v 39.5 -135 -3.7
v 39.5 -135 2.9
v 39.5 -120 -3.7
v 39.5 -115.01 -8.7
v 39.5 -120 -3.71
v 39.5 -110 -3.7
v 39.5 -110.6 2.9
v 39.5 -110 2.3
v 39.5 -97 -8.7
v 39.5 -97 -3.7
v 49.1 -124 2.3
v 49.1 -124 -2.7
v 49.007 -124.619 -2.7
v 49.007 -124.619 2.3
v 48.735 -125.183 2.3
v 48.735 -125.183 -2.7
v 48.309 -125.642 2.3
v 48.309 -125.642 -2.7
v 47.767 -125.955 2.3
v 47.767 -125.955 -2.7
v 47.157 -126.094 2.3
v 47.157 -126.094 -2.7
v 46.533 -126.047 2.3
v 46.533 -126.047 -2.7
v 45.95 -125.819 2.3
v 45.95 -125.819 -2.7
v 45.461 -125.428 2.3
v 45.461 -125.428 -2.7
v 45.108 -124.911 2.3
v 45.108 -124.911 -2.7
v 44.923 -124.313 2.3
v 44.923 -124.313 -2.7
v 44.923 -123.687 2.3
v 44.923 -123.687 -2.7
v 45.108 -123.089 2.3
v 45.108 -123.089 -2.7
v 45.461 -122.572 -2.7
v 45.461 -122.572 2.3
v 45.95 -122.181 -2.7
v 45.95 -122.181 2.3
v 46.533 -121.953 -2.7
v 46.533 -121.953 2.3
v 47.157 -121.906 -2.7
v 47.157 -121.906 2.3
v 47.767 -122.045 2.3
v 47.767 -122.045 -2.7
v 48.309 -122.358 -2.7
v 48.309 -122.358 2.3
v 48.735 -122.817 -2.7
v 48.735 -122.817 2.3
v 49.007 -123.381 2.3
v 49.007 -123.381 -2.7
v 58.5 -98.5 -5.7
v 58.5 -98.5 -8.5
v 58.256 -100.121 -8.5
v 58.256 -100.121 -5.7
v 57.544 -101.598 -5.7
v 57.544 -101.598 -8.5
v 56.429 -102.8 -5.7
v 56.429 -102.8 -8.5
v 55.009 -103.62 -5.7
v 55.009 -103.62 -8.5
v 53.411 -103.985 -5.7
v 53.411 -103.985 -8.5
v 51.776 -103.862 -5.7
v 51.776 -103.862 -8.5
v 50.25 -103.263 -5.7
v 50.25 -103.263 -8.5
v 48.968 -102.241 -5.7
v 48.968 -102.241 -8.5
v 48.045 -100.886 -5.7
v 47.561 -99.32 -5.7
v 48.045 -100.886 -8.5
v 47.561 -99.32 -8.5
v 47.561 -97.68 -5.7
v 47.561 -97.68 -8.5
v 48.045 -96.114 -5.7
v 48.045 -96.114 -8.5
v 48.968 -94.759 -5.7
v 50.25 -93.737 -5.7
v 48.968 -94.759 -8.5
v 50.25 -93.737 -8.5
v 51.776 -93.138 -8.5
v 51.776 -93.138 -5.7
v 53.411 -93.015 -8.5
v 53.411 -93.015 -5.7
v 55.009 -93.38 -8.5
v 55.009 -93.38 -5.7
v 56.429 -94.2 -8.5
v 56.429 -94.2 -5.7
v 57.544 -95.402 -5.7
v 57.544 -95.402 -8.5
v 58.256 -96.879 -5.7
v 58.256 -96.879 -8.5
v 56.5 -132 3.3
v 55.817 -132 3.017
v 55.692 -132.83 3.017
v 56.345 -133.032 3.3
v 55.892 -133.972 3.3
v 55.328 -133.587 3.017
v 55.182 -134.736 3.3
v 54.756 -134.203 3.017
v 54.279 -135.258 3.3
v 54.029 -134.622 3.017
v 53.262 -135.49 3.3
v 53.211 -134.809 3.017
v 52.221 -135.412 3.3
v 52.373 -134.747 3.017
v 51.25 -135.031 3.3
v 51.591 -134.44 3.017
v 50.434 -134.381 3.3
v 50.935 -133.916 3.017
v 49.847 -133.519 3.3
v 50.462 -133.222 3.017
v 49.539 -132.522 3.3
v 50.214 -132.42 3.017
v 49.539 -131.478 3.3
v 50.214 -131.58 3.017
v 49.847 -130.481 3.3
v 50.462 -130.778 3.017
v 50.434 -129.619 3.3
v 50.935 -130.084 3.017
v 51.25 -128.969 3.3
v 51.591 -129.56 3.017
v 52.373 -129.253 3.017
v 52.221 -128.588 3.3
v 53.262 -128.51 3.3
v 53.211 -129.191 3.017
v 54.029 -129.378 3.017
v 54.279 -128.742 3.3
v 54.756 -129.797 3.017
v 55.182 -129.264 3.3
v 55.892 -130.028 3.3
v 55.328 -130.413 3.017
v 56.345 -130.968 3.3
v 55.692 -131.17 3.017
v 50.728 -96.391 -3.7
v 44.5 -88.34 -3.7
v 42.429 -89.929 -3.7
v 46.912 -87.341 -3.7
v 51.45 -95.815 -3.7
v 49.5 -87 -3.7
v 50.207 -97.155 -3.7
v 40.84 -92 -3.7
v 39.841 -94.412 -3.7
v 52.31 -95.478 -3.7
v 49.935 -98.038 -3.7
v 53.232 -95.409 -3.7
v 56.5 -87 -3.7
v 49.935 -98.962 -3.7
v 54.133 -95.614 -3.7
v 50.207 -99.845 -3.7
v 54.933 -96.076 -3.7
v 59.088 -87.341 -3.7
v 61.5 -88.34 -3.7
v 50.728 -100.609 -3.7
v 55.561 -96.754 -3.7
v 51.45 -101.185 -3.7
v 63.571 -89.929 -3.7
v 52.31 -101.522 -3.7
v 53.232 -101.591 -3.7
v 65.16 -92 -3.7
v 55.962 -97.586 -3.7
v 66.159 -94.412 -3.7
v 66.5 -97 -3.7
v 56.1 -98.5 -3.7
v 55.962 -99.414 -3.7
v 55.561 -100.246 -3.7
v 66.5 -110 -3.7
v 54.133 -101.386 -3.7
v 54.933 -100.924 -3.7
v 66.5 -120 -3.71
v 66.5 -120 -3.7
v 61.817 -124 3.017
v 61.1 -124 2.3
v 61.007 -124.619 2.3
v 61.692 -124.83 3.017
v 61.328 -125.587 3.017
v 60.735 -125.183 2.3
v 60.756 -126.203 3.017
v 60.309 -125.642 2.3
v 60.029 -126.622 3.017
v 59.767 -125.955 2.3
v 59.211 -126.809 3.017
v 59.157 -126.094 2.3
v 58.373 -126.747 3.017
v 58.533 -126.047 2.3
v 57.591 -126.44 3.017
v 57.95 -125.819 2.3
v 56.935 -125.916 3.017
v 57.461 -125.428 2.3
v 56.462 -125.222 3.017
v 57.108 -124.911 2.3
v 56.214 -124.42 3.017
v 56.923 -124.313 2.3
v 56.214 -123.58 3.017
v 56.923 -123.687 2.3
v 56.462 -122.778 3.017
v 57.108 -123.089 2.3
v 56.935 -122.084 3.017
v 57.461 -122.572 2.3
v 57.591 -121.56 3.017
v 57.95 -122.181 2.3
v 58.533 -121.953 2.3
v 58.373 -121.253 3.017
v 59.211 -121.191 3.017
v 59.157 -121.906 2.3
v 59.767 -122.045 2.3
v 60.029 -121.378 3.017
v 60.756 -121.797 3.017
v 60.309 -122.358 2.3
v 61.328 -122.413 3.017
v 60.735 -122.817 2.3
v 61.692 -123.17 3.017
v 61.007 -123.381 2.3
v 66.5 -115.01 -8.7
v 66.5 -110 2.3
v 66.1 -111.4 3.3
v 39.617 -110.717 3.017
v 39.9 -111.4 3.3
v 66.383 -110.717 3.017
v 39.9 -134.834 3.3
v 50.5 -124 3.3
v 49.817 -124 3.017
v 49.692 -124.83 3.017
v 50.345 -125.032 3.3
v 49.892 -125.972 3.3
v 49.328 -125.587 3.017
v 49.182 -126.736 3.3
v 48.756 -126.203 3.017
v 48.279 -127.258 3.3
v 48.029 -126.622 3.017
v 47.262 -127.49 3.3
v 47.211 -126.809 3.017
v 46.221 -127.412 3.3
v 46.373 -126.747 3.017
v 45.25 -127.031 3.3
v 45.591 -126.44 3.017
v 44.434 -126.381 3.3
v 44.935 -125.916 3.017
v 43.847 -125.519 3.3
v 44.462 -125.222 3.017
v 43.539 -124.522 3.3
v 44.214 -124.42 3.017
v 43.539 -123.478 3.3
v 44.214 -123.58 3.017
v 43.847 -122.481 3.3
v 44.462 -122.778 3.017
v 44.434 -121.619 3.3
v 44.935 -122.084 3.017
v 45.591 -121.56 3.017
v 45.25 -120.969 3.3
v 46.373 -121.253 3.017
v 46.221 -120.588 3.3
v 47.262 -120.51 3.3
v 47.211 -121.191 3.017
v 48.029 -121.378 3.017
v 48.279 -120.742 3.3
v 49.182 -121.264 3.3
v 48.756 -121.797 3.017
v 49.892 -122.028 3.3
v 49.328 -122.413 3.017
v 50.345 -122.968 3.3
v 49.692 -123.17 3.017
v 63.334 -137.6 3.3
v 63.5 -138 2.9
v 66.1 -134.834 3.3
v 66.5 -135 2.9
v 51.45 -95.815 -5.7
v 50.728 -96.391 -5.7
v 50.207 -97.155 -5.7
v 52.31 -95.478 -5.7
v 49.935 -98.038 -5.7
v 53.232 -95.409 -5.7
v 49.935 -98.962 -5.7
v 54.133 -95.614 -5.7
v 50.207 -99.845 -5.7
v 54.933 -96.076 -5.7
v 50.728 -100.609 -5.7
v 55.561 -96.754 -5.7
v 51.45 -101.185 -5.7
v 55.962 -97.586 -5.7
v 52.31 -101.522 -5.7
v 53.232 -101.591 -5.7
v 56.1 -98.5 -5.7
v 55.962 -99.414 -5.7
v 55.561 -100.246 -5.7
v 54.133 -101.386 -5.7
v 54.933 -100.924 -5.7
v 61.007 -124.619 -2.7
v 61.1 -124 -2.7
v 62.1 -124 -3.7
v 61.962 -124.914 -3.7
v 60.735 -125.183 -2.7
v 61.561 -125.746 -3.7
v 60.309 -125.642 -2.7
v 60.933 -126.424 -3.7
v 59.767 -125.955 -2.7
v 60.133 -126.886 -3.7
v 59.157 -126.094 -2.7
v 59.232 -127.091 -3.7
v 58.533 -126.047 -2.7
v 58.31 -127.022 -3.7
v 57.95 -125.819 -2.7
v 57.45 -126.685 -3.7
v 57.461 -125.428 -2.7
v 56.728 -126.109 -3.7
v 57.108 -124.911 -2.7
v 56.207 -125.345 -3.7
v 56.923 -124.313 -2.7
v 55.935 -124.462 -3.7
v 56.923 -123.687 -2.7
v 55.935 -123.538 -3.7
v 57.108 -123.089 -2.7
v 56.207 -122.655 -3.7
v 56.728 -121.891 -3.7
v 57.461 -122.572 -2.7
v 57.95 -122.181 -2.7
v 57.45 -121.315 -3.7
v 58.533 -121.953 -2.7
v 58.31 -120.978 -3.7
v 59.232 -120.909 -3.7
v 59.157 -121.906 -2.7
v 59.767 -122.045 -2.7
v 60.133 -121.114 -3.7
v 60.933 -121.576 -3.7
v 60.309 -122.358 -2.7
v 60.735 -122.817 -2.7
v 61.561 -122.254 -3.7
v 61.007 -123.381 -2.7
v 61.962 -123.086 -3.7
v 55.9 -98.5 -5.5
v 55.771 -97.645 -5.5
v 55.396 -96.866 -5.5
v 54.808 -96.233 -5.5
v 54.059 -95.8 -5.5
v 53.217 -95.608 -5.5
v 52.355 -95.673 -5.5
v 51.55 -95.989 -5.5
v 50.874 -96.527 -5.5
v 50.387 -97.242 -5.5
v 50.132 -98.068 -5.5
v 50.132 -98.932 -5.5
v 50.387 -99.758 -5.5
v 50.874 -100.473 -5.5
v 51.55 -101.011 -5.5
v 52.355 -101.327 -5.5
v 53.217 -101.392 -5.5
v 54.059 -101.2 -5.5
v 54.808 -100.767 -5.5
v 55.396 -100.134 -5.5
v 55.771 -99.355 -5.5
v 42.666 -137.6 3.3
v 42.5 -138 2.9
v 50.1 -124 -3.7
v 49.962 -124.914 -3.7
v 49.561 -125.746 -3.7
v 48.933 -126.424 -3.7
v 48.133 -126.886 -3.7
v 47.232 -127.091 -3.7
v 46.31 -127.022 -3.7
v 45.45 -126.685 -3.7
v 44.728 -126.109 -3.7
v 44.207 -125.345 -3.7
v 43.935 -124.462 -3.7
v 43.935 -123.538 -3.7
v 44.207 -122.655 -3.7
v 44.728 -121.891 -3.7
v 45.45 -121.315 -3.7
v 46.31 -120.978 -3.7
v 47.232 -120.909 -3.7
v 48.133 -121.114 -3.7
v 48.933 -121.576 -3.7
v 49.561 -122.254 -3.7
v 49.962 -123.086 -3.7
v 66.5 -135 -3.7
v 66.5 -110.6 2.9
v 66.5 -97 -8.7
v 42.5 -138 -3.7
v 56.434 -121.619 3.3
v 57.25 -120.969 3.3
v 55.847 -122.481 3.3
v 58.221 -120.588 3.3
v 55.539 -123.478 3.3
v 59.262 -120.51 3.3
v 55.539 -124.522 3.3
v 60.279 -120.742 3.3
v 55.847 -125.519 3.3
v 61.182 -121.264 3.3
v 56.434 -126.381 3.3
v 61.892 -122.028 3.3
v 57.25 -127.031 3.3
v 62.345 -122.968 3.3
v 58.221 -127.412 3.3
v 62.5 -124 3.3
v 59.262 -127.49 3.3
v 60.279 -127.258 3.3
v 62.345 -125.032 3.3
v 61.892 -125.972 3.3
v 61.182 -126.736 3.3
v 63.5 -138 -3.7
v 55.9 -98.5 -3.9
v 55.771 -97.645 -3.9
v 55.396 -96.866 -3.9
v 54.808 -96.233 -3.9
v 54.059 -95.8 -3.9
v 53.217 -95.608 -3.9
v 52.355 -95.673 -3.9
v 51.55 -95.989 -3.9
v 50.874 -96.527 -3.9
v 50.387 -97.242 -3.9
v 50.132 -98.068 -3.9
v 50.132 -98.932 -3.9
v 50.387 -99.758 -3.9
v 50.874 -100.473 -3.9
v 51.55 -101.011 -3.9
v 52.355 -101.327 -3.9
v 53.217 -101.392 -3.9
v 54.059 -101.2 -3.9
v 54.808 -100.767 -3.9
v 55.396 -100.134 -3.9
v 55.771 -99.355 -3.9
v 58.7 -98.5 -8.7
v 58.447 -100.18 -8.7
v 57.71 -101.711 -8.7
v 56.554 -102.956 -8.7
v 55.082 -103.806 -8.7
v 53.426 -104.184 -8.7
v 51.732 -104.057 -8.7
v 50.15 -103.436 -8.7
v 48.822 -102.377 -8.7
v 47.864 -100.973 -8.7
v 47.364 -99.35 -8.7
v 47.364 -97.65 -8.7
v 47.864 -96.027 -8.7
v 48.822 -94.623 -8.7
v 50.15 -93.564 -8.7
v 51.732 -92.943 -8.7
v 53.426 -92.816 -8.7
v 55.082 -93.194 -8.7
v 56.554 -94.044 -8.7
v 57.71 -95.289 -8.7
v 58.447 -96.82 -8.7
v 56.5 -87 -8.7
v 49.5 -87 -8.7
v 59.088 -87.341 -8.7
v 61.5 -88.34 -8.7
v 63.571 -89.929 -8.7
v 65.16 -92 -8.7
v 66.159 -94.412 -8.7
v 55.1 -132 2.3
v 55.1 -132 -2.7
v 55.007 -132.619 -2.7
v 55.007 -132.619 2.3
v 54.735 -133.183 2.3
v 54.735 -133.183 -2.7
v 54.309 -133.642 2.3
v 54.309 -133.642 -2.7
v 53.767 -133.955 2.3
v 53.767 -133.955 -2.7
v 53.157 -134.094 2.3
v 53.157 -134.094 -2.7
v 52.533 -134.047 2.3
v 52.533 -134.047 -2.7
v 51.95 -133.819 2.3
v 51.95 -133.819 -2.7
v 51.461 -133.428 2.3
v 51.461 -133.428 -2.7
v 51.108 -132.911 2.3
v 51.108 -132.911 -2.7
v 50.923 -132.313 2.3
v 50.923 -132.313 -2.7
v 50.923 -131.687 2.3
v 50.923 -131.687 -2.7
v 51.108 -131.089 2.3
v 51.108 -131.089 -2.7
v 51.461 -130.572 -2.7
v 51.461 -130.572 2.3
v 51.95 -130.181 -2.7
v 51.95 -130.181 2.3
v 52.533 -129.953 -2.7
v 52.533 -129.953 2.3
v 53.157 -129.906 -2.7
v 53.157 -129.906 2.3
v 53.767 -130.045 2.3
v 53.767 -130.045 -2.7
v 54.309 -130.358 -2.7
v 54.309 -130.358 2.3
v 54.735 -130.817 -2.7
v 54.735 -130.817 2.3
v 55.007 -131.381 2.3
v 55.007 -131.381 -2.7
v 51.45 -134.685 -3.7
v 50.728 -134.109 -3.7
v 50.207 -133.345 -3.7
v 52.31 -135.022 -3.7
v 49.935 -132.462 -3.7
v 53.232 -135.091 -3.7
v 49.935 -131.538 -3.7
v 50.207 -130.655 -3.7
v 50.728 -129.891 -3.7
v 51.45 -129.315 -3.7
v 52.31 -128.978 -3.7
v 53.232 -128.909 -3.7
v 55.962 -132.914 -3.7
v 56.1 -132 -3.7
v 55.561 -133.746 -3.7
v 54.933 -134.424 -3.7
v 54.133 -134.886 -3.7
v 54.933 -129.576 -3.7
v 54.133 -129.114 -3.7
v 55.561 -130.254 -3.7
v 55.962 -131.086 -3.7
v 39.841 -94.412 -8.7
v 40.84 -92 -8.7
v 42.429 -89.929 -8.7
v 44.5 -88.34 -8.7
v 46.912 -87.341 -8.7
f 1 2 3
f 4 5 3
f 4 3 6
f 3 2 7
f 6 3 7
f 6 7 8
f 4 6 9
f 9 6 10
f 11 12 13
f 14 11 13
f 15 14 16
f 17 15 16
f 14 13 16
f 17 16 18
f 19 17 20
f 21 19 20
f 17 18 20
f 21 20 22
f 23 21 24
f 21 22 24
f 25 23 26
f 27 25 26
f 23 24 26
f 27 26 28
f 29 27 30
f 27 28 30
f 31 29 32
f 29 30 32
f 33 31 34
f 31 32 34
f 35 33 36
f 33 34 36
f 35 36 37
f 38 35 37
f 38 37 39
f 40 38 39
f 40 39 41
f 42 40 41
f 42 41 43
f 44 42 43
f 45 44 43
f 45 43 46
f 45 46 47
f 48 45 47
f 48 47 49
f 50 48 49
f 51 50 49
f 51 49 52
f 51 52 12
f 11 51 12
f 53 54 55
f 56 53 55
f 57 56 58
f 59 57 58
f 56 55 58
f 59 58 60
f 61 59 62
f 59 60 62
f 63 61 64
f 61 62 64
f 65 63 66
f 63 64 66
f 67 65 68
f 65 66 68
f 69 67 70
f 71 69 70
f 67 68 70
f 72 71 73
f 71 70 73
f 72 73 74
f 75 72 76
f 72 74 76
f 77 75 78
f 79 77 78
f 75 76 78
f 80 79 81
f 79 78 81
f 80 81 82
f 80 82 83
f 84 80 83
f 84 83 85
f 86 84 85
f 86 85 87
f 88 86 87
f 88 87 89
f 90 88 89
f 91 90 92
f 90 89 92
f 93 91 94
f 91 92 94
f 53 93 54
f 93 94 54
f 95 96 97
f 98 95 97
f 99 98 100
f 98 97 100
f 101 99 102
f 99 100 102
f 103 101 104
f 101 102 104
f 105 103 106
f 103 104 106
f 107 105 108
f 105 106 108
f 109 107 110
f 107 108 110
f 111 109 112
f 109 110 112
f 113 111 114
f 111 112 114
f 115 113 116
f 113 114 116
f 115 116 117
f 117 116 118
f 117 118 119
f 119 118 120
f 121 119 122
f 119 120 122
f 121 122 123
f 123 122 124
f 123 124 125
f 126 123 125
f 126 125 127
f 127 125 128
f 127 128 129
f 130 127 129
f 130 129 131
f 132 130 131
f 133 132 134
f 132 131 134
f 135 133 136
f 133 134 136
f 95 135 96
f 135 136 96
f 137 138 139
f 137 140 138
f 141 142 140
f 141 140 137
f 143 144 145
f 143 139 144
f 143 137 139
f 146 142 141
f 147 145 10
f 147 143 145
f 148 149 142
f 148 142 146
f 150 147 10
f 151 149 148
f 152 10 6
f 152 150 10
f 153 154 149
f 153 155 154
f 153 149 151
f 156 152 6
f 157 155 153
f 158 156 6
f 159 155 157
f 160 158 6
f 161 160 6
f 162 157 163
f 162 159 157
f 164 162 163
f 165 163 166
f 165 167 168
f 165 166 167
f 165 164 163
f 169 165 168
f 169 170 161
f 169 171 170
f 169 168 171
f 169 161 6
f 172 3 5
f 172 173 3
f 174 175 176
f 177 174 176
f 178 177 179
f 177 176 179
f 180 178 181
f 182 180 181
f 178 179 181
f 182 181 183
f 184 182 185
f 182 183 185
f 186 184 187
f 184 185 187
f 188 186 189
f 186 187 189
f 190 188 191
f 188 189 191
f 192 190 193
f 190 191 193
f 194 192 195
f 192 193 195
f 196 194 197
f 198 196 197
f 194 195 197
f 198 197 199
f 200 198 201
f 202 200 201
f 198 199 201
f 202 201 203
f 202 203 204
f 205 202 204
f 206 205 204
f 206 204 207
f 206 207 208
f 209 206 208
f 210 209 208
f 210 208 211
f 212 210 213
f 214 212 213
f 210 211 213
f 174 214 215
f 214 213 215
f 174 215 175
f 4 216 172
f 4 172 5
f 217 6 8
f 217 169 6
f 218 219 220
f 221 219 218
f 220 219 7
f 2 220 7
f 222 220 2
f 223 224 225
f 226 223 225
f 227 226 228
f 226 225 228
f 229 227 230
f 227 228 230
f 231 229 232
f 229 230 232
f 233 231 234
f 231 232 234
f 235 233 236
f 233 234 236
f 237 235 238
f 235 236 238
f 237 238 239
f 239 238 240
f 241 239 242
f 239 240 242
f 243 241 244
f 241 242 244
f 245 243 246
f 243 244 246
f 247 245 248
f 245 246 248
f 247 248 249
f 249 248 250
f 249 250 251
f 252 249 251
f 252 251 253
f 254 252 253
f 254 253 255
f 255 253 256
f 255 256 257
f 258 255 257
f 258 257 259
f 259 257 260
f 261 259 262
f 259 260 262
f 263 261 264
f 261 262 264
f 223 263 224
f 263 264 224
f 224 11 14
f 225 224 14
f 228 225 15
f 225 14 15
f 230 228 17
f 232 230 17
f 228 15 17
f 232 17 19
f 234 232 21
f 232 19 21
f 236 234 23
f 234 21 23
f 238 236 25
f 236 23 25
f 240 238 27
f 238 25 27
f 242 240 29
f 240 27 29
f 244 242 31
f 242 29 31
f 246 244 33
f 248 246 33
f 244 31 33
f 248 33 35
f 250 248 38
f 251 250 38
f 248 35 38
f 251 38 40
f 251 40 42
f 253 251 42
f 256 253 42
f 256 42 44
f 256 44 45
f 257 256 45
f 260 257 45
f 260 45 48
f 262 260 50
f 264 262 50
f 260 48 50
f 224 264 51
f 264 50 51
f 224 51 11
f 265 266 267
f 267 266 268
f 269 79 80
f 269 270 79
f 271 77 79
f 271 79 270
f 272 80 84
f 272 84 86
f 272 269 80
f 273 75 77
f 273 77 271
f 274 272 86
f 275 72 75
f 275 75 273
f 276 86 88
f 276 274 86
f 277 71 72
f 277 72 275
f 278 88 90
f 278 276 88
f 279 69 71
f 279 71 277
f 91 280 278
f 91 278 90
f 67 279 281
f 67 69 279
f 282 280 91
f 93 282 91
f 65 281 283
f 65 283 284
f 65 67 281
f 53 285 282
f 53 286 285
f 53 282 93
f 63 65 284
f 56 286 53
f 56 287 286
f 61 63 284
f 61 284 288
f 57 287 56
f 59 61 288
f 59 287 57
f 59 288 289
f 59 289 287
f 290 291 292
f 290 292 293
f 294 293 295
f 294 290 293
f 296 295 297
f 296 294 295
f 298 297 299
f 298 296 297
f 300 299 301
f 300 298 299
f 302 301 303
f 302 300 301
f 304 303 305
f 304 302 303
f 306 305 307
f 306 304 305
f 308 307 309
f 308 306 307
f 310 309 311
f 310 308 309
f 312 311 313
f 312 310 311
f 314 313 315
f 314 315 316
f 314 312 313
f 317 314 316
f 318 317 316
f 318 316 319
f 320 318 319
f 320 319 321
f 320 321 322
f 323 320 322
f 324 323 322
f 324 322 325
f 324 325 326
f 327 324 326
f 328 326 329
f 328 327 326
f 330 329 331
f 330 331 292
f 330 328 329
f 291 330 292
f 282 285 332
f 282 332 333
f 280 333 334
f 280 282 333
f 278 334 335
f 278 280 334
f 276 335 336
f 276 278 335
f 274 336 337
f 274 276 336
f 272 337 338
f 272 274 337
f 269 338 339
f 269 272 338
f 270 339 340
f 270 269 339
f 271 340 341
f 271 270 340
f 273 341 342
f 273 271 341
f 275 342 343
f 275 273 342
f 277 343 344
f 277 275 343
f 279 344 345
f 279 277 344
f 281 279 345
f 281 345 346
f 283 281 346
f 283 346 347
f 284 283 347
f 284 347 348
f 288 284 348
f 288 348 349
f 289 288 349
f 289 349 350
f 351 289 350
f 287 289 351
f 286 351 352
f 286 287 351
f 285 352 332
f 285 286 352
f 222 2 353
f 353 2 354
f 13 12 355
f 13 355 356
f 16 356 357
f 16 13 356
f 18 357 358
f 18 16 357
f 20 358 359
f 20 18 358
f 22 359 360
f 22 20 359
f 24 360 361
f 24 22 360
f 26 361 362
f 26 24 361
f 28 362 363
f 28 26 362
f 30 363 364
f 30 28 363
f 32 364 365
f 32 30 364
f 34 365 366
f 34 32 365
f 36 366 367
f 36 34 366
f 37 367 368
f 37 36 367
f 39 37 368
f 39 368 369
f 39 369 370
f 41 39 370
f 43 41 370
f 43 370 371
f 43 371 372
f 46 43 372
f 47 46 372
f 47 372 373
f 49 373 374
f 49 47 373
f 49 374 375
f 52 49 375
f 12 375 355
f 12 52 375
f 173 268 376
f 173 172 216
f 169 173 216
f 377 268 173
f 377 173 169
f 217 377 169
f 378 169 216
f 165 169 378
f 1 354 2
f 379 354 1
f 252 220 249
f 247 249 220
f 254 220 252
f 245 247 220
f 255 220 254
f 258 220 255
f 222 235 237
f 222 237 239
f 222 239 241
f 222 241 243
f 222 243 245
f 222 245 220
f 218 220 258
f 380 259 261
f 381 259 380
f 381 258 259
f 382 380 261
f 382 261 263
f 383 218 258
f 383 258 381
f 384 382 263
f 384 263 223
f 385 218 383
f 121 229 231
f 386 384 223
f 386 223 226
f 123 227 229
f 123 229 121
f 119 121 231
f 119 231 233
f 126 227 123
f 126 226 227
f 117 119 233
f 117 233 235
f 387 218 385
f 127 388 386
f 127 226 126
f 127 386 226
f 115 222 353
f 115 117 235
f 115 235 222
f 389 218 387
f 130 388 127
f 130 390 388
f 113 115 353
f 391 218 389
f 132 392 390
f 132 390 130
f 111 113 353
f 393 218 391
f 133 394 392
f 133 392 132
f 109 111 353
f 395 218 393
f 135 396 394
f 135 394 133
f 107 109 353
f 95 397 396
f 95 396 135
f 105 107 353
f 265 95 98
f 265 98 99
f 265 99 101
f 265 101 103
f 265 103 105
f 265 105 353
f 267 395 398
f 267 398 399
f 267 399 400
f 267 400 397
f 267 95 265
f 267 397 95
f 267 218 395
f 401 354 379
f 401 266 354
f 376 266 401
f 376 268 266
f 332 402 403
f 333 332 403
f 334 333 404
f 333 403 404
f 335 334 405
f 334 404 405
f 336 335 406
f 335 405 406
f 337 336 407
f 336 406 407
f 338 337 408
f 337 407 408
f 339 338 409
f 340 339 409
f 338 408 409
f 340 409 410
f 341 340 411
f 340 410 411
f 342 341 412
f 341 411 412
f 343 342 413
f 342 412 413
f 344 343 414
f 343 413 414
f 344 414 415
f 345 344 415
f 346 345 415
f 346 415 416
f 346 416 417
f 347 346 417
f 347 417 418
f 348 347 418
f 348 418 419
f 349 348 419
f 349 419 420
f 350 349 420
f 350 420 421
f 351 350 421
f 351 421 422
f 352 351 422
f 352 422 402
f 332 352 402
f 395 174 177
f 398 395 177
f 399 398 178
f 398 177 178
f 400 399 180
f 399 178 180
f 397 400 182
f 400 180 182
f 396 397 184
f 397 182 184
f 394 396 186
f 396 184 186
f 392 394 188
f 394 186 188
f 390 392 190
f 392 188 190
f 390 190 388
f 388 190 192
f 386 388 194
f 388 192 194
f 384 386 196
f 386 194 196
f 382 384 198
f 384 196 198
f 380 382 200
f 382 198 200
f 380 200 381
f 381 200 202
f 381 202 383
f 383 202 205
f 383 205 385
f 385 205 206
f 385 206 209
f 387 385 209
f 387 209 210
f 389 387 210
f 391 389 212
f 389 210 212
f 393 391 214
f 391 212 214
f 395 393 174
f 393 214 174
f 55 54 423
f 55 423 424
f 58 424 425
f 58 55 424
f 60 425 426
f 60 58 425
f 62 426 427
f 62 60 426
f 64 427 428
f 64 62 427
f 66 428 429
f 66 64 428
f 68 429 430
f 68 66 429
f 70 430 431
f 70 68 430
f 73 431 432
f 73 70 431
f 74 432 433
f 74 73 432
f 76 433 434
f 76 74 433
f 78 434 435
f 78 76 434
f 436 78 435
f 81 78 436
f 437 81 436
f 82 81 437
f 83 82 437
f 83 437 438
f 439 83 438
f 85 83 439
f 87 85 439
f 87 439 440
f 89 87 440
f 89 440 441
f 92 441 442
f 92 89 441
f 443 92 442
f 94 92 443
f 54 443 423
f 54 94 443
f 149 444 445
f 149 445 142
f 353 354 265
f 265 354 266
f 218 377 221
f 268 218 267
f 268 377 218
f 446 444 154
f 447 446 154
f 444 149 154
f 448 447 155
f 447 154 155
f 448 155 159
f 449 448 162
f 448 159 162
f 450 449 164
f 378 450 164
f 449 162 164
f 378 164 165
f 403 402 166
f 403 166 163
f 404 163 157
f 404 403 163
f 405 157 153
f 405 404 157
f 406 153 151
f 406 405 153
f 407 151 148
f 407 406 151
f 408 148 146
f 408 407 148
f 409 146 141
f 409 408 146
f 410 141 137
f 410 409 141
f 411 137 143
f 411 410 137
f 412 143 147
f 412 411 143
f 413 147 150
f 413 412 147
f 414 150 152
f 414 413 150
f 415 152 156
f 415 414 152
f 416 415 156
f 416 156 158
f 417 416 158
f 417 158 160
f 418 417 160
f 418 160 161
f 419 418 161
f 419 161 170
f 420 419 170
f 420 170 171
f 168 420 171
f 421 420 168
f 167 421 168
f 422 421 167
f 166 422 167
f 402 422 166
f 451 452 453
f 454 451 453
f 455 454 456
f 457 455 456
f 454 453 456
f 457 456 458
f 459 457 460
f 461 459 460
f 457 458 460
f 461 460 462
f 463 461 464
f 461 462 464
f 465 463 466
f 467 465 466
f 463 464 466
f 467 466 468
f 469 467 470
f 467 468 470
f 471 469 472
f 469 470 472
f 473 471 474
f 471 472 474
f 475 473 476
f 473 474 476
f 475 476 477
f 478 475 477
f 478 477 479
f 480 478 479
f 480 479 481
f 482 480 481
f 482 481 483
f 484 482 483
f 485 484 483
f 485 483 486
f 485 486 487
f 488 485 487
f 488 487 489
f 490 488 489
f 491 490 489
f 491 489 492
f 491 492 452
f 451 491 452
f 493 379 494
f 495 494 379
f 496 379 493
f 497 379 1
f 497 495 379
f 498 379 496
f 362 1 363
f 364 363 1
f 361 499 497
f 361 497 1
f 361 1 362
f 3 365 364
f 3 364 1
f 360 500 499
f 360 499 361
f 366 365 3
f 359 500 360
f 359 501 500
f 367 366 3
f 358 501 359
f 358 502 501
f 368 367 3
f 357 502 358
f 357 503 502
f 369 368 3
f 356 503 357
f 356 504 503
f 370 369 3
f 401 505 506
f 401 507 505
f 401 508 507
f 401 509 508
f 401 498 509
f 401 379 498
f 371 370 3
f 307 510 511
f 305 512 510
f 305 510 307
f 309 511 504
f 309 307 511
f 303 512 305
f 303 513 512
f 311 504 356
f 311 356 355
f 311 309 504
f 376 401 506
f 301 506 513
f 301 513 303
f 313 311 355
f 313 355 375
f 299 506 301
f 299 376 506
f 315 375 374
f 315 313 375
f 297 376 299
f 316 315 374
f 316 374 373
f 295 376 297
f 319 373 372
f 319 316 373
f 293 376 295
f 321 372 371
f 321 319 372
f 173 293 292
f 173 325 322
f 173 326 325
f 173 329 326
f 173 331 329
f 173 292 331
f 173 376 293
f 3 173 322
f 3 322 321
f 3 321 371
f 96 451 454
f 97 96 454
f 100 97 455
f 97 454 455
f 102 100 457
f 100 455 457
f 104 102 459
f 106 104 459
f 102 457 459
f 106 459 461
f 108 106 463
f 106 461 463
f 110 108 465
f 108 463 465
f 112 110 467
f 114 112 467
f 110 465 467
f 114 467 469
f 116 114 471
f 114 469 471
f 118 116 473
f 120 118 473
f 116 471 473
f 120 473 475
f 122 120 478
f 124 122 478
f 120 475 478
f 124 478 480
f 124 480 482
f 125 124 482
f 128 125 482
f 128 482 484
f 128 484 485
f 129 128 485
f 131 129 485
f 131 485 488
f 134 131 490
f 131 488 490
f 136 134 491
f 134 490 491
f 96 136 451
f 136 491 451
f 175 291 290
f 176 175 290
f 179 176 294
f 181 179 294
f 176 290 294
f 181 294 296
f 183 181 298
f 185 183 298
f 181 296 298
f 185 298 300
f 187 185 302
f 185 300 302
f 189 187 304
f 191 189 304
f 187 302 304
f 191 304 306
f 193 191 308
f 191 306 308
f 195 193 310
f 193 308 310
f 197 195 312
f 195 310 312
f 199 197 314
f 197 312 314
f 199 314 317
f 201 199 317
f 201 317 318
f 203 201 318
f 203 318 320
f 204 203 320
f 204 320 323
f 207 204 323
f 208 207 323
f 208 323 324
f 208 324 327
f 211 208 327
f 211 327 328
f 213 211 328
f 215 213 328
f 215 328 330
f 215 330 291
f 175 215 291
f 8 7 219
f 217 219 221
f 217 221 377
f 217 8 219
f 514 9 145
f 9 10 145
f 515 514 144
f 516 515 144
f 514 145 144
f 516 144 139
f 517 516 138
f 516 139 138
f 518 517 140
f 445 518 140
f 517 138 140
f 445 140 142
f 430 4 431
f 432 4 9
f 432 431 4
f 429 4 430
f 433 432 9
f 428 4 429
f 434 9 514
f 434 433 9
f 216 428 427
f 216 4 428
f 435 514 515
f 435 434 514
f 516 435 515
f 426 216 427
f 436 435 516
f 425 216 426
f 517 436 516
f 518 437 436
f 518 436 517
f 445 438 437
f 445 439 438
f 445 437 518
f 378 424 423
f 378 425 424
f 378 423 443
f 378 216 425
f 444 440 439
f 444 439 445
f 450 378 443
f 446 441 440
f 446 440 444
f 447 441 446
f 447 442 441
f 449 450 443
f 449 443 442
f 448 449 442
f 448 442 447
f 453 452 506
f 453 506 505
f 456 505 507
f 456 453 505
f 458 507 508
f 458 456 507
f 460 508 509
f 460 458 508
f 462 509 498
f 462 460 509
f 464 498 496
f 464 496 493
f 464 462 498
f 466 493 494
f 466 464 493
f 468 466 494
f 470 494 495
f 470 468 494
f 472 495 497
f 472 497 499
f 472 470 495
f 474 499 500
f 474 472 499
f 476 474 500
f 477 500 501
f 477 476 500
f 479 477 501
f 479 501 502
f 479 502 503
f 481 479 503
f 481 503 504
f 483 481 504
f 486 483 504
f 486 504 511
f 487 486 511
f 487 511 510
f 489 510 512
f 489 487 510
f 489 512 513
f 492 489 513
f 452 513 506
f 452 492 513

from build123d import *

# Parameters (mm, degrees)
PAD024_DEPTH    = 13.5
SKETCH067_R     = 2.9
POCKET045_DEPTH = 5.001
SKETCH068_R     = 5.5
POCKET046_DEPTH = 3
SKETCH069_R     = 2.1
POCKET047_DEPTH = 7.001
CHAMFER023_SIZE = 4.99
FILLET014_R     = 10
CHAMFER024_SIZE = 3
CHAMFER025_SIZE = 0.2
CHAMFER026_SIZE = 1
CHAMFER027_SIZE = 1
CHAMFER028_SIZE = 0.4


with BuildPart() as part:
    # Sketch066 → Pad024 (new body, symmetric)
    with BuildSketch(Plane.YZ):
        Polygon((23, 0), (0, 0), (0, 7), (-28, 7), (-28, 0), (-10, 0), (-10, -5), (23, -5), align=None)
    extrude(amount=PAD024_DEPTH, both=True)

    # Sketch067 → Pocket045 (cut, through all)
    with BuildSketch(Plane.XY):
        with Locations((0, 11.5)):
            Circle(SKETCH067_R)
    extrude(amount=-POCKET045_DEPTH, mode=Mode.SUBTRACT)

    # Sketch068 (on Face7 of Pocket045) → Pocket046 (cut)
    with BuildSketch(Plane(origin=(0, 0, -5), x_dir=(1, 0, 0), z_dir=(0, 0, -1))):
        with Locations((0, -11.5)):
            Circle(SKETCH068_R)
    extrude(amount=-POCKET046_DEPTH, mode=Mode.SUBTRACT)

    # Sketch069 (on Face10 of Pocket046) → Pocket047 (cut, through all)
    with BuildSketch(Plane(origin=(0, 0, 0), x_dir=(1, 0, 0), z_dir=(0, 0, -1))):
        with Locations((0, 22)):
            Circle(SKETCH069_R)
        with Locations((-6, 14)):
            Circle(SKETCH069_R)
        with Locations((6, 14)):
            Circle(SKETCH069_R)
    extrude(amount=-POCKET047_DEPTH, mode=Mode.SUBTRACT)

    # Chamfer023
    chamfer023_edges = [part.edges().sort_by_distance(p)[0] for p in [
        (0, -10, -5),
    ]]
    chamfer(chamfer023_edges, length=CHAMFER023_SIZE)

    # Fillet014
    fillet014_edges = [part.edges().sort_by_distance(p)[0] for p in [
        (13.5, 23, -2.5),
        (-13.5, 23, -2.5),
    ]]
    fillet(fillet014_edges, radius=FILLET014_R)

    # Chamfer024
    chamfer024_edges = [part.edges().sort_by_distance(p)[0] for p in [
        (13.5, -28, 3.5),
        (-13.5, -28, 3.5),
    ]]
    chamfer(chamfer024_edges, length=CHAMFER024_SIZE)

    # Chamfer025
    chamfer025_edges = [part.edges().sort_by_distance(p)[0] for p in [
        (-2.9, 11.5, 0),
        (-2.9, 11.5, -2),
        (-5.5, 11.5, -5),
    ]]
    chamfer(chamfer025_edges, length=CHAMFER025_SIZE)

    # Chamfer026
    chamfer026_edges = [part.edges().sort_by_distance(p)[0] for p in [
        (3.9, -14, 0),
        (3.9, -14, 7),
        (-2.1, -22, 7),
        (-2.1, -22, 0),
        (-8.1, -14, 0),
        (-8.1, -14, 7),
    ]]
    chamfer(chamfer026_edges, length=CHAMFER026_SIZE)

    # Chamfer027
    chamfer027_edges = [part.edges().sort_by_distance(p)[0] for p in [
        (0, 0, 7),
    ]]
    chamfer(chamfer027_edges, length=CHAMFER027_SIZE)

    # Chamfer028
    chamfer028_edges = [part.edges().sort_by_distance(p)[0] for p in [
        (-13.5, -13, 7),
        (0, -1, 7),
        (-12, -26.5, 7),
        (13.5, -13, 7),
        (0, -28, 7),
        (12, -26.5, 7),
        (2.9, -14, 7),
        (-3.1, -22, 7),
        (-9.1, -14, 7),
    ]]
    chamfer(chamfer028_edges, length=CHAMFER028_SIZE)


with BuildPart() as part_1:
    # Body013 placement: moved
    add(part.part.moved(Location((53, -110, -3.7))))


solid = part_1.part
